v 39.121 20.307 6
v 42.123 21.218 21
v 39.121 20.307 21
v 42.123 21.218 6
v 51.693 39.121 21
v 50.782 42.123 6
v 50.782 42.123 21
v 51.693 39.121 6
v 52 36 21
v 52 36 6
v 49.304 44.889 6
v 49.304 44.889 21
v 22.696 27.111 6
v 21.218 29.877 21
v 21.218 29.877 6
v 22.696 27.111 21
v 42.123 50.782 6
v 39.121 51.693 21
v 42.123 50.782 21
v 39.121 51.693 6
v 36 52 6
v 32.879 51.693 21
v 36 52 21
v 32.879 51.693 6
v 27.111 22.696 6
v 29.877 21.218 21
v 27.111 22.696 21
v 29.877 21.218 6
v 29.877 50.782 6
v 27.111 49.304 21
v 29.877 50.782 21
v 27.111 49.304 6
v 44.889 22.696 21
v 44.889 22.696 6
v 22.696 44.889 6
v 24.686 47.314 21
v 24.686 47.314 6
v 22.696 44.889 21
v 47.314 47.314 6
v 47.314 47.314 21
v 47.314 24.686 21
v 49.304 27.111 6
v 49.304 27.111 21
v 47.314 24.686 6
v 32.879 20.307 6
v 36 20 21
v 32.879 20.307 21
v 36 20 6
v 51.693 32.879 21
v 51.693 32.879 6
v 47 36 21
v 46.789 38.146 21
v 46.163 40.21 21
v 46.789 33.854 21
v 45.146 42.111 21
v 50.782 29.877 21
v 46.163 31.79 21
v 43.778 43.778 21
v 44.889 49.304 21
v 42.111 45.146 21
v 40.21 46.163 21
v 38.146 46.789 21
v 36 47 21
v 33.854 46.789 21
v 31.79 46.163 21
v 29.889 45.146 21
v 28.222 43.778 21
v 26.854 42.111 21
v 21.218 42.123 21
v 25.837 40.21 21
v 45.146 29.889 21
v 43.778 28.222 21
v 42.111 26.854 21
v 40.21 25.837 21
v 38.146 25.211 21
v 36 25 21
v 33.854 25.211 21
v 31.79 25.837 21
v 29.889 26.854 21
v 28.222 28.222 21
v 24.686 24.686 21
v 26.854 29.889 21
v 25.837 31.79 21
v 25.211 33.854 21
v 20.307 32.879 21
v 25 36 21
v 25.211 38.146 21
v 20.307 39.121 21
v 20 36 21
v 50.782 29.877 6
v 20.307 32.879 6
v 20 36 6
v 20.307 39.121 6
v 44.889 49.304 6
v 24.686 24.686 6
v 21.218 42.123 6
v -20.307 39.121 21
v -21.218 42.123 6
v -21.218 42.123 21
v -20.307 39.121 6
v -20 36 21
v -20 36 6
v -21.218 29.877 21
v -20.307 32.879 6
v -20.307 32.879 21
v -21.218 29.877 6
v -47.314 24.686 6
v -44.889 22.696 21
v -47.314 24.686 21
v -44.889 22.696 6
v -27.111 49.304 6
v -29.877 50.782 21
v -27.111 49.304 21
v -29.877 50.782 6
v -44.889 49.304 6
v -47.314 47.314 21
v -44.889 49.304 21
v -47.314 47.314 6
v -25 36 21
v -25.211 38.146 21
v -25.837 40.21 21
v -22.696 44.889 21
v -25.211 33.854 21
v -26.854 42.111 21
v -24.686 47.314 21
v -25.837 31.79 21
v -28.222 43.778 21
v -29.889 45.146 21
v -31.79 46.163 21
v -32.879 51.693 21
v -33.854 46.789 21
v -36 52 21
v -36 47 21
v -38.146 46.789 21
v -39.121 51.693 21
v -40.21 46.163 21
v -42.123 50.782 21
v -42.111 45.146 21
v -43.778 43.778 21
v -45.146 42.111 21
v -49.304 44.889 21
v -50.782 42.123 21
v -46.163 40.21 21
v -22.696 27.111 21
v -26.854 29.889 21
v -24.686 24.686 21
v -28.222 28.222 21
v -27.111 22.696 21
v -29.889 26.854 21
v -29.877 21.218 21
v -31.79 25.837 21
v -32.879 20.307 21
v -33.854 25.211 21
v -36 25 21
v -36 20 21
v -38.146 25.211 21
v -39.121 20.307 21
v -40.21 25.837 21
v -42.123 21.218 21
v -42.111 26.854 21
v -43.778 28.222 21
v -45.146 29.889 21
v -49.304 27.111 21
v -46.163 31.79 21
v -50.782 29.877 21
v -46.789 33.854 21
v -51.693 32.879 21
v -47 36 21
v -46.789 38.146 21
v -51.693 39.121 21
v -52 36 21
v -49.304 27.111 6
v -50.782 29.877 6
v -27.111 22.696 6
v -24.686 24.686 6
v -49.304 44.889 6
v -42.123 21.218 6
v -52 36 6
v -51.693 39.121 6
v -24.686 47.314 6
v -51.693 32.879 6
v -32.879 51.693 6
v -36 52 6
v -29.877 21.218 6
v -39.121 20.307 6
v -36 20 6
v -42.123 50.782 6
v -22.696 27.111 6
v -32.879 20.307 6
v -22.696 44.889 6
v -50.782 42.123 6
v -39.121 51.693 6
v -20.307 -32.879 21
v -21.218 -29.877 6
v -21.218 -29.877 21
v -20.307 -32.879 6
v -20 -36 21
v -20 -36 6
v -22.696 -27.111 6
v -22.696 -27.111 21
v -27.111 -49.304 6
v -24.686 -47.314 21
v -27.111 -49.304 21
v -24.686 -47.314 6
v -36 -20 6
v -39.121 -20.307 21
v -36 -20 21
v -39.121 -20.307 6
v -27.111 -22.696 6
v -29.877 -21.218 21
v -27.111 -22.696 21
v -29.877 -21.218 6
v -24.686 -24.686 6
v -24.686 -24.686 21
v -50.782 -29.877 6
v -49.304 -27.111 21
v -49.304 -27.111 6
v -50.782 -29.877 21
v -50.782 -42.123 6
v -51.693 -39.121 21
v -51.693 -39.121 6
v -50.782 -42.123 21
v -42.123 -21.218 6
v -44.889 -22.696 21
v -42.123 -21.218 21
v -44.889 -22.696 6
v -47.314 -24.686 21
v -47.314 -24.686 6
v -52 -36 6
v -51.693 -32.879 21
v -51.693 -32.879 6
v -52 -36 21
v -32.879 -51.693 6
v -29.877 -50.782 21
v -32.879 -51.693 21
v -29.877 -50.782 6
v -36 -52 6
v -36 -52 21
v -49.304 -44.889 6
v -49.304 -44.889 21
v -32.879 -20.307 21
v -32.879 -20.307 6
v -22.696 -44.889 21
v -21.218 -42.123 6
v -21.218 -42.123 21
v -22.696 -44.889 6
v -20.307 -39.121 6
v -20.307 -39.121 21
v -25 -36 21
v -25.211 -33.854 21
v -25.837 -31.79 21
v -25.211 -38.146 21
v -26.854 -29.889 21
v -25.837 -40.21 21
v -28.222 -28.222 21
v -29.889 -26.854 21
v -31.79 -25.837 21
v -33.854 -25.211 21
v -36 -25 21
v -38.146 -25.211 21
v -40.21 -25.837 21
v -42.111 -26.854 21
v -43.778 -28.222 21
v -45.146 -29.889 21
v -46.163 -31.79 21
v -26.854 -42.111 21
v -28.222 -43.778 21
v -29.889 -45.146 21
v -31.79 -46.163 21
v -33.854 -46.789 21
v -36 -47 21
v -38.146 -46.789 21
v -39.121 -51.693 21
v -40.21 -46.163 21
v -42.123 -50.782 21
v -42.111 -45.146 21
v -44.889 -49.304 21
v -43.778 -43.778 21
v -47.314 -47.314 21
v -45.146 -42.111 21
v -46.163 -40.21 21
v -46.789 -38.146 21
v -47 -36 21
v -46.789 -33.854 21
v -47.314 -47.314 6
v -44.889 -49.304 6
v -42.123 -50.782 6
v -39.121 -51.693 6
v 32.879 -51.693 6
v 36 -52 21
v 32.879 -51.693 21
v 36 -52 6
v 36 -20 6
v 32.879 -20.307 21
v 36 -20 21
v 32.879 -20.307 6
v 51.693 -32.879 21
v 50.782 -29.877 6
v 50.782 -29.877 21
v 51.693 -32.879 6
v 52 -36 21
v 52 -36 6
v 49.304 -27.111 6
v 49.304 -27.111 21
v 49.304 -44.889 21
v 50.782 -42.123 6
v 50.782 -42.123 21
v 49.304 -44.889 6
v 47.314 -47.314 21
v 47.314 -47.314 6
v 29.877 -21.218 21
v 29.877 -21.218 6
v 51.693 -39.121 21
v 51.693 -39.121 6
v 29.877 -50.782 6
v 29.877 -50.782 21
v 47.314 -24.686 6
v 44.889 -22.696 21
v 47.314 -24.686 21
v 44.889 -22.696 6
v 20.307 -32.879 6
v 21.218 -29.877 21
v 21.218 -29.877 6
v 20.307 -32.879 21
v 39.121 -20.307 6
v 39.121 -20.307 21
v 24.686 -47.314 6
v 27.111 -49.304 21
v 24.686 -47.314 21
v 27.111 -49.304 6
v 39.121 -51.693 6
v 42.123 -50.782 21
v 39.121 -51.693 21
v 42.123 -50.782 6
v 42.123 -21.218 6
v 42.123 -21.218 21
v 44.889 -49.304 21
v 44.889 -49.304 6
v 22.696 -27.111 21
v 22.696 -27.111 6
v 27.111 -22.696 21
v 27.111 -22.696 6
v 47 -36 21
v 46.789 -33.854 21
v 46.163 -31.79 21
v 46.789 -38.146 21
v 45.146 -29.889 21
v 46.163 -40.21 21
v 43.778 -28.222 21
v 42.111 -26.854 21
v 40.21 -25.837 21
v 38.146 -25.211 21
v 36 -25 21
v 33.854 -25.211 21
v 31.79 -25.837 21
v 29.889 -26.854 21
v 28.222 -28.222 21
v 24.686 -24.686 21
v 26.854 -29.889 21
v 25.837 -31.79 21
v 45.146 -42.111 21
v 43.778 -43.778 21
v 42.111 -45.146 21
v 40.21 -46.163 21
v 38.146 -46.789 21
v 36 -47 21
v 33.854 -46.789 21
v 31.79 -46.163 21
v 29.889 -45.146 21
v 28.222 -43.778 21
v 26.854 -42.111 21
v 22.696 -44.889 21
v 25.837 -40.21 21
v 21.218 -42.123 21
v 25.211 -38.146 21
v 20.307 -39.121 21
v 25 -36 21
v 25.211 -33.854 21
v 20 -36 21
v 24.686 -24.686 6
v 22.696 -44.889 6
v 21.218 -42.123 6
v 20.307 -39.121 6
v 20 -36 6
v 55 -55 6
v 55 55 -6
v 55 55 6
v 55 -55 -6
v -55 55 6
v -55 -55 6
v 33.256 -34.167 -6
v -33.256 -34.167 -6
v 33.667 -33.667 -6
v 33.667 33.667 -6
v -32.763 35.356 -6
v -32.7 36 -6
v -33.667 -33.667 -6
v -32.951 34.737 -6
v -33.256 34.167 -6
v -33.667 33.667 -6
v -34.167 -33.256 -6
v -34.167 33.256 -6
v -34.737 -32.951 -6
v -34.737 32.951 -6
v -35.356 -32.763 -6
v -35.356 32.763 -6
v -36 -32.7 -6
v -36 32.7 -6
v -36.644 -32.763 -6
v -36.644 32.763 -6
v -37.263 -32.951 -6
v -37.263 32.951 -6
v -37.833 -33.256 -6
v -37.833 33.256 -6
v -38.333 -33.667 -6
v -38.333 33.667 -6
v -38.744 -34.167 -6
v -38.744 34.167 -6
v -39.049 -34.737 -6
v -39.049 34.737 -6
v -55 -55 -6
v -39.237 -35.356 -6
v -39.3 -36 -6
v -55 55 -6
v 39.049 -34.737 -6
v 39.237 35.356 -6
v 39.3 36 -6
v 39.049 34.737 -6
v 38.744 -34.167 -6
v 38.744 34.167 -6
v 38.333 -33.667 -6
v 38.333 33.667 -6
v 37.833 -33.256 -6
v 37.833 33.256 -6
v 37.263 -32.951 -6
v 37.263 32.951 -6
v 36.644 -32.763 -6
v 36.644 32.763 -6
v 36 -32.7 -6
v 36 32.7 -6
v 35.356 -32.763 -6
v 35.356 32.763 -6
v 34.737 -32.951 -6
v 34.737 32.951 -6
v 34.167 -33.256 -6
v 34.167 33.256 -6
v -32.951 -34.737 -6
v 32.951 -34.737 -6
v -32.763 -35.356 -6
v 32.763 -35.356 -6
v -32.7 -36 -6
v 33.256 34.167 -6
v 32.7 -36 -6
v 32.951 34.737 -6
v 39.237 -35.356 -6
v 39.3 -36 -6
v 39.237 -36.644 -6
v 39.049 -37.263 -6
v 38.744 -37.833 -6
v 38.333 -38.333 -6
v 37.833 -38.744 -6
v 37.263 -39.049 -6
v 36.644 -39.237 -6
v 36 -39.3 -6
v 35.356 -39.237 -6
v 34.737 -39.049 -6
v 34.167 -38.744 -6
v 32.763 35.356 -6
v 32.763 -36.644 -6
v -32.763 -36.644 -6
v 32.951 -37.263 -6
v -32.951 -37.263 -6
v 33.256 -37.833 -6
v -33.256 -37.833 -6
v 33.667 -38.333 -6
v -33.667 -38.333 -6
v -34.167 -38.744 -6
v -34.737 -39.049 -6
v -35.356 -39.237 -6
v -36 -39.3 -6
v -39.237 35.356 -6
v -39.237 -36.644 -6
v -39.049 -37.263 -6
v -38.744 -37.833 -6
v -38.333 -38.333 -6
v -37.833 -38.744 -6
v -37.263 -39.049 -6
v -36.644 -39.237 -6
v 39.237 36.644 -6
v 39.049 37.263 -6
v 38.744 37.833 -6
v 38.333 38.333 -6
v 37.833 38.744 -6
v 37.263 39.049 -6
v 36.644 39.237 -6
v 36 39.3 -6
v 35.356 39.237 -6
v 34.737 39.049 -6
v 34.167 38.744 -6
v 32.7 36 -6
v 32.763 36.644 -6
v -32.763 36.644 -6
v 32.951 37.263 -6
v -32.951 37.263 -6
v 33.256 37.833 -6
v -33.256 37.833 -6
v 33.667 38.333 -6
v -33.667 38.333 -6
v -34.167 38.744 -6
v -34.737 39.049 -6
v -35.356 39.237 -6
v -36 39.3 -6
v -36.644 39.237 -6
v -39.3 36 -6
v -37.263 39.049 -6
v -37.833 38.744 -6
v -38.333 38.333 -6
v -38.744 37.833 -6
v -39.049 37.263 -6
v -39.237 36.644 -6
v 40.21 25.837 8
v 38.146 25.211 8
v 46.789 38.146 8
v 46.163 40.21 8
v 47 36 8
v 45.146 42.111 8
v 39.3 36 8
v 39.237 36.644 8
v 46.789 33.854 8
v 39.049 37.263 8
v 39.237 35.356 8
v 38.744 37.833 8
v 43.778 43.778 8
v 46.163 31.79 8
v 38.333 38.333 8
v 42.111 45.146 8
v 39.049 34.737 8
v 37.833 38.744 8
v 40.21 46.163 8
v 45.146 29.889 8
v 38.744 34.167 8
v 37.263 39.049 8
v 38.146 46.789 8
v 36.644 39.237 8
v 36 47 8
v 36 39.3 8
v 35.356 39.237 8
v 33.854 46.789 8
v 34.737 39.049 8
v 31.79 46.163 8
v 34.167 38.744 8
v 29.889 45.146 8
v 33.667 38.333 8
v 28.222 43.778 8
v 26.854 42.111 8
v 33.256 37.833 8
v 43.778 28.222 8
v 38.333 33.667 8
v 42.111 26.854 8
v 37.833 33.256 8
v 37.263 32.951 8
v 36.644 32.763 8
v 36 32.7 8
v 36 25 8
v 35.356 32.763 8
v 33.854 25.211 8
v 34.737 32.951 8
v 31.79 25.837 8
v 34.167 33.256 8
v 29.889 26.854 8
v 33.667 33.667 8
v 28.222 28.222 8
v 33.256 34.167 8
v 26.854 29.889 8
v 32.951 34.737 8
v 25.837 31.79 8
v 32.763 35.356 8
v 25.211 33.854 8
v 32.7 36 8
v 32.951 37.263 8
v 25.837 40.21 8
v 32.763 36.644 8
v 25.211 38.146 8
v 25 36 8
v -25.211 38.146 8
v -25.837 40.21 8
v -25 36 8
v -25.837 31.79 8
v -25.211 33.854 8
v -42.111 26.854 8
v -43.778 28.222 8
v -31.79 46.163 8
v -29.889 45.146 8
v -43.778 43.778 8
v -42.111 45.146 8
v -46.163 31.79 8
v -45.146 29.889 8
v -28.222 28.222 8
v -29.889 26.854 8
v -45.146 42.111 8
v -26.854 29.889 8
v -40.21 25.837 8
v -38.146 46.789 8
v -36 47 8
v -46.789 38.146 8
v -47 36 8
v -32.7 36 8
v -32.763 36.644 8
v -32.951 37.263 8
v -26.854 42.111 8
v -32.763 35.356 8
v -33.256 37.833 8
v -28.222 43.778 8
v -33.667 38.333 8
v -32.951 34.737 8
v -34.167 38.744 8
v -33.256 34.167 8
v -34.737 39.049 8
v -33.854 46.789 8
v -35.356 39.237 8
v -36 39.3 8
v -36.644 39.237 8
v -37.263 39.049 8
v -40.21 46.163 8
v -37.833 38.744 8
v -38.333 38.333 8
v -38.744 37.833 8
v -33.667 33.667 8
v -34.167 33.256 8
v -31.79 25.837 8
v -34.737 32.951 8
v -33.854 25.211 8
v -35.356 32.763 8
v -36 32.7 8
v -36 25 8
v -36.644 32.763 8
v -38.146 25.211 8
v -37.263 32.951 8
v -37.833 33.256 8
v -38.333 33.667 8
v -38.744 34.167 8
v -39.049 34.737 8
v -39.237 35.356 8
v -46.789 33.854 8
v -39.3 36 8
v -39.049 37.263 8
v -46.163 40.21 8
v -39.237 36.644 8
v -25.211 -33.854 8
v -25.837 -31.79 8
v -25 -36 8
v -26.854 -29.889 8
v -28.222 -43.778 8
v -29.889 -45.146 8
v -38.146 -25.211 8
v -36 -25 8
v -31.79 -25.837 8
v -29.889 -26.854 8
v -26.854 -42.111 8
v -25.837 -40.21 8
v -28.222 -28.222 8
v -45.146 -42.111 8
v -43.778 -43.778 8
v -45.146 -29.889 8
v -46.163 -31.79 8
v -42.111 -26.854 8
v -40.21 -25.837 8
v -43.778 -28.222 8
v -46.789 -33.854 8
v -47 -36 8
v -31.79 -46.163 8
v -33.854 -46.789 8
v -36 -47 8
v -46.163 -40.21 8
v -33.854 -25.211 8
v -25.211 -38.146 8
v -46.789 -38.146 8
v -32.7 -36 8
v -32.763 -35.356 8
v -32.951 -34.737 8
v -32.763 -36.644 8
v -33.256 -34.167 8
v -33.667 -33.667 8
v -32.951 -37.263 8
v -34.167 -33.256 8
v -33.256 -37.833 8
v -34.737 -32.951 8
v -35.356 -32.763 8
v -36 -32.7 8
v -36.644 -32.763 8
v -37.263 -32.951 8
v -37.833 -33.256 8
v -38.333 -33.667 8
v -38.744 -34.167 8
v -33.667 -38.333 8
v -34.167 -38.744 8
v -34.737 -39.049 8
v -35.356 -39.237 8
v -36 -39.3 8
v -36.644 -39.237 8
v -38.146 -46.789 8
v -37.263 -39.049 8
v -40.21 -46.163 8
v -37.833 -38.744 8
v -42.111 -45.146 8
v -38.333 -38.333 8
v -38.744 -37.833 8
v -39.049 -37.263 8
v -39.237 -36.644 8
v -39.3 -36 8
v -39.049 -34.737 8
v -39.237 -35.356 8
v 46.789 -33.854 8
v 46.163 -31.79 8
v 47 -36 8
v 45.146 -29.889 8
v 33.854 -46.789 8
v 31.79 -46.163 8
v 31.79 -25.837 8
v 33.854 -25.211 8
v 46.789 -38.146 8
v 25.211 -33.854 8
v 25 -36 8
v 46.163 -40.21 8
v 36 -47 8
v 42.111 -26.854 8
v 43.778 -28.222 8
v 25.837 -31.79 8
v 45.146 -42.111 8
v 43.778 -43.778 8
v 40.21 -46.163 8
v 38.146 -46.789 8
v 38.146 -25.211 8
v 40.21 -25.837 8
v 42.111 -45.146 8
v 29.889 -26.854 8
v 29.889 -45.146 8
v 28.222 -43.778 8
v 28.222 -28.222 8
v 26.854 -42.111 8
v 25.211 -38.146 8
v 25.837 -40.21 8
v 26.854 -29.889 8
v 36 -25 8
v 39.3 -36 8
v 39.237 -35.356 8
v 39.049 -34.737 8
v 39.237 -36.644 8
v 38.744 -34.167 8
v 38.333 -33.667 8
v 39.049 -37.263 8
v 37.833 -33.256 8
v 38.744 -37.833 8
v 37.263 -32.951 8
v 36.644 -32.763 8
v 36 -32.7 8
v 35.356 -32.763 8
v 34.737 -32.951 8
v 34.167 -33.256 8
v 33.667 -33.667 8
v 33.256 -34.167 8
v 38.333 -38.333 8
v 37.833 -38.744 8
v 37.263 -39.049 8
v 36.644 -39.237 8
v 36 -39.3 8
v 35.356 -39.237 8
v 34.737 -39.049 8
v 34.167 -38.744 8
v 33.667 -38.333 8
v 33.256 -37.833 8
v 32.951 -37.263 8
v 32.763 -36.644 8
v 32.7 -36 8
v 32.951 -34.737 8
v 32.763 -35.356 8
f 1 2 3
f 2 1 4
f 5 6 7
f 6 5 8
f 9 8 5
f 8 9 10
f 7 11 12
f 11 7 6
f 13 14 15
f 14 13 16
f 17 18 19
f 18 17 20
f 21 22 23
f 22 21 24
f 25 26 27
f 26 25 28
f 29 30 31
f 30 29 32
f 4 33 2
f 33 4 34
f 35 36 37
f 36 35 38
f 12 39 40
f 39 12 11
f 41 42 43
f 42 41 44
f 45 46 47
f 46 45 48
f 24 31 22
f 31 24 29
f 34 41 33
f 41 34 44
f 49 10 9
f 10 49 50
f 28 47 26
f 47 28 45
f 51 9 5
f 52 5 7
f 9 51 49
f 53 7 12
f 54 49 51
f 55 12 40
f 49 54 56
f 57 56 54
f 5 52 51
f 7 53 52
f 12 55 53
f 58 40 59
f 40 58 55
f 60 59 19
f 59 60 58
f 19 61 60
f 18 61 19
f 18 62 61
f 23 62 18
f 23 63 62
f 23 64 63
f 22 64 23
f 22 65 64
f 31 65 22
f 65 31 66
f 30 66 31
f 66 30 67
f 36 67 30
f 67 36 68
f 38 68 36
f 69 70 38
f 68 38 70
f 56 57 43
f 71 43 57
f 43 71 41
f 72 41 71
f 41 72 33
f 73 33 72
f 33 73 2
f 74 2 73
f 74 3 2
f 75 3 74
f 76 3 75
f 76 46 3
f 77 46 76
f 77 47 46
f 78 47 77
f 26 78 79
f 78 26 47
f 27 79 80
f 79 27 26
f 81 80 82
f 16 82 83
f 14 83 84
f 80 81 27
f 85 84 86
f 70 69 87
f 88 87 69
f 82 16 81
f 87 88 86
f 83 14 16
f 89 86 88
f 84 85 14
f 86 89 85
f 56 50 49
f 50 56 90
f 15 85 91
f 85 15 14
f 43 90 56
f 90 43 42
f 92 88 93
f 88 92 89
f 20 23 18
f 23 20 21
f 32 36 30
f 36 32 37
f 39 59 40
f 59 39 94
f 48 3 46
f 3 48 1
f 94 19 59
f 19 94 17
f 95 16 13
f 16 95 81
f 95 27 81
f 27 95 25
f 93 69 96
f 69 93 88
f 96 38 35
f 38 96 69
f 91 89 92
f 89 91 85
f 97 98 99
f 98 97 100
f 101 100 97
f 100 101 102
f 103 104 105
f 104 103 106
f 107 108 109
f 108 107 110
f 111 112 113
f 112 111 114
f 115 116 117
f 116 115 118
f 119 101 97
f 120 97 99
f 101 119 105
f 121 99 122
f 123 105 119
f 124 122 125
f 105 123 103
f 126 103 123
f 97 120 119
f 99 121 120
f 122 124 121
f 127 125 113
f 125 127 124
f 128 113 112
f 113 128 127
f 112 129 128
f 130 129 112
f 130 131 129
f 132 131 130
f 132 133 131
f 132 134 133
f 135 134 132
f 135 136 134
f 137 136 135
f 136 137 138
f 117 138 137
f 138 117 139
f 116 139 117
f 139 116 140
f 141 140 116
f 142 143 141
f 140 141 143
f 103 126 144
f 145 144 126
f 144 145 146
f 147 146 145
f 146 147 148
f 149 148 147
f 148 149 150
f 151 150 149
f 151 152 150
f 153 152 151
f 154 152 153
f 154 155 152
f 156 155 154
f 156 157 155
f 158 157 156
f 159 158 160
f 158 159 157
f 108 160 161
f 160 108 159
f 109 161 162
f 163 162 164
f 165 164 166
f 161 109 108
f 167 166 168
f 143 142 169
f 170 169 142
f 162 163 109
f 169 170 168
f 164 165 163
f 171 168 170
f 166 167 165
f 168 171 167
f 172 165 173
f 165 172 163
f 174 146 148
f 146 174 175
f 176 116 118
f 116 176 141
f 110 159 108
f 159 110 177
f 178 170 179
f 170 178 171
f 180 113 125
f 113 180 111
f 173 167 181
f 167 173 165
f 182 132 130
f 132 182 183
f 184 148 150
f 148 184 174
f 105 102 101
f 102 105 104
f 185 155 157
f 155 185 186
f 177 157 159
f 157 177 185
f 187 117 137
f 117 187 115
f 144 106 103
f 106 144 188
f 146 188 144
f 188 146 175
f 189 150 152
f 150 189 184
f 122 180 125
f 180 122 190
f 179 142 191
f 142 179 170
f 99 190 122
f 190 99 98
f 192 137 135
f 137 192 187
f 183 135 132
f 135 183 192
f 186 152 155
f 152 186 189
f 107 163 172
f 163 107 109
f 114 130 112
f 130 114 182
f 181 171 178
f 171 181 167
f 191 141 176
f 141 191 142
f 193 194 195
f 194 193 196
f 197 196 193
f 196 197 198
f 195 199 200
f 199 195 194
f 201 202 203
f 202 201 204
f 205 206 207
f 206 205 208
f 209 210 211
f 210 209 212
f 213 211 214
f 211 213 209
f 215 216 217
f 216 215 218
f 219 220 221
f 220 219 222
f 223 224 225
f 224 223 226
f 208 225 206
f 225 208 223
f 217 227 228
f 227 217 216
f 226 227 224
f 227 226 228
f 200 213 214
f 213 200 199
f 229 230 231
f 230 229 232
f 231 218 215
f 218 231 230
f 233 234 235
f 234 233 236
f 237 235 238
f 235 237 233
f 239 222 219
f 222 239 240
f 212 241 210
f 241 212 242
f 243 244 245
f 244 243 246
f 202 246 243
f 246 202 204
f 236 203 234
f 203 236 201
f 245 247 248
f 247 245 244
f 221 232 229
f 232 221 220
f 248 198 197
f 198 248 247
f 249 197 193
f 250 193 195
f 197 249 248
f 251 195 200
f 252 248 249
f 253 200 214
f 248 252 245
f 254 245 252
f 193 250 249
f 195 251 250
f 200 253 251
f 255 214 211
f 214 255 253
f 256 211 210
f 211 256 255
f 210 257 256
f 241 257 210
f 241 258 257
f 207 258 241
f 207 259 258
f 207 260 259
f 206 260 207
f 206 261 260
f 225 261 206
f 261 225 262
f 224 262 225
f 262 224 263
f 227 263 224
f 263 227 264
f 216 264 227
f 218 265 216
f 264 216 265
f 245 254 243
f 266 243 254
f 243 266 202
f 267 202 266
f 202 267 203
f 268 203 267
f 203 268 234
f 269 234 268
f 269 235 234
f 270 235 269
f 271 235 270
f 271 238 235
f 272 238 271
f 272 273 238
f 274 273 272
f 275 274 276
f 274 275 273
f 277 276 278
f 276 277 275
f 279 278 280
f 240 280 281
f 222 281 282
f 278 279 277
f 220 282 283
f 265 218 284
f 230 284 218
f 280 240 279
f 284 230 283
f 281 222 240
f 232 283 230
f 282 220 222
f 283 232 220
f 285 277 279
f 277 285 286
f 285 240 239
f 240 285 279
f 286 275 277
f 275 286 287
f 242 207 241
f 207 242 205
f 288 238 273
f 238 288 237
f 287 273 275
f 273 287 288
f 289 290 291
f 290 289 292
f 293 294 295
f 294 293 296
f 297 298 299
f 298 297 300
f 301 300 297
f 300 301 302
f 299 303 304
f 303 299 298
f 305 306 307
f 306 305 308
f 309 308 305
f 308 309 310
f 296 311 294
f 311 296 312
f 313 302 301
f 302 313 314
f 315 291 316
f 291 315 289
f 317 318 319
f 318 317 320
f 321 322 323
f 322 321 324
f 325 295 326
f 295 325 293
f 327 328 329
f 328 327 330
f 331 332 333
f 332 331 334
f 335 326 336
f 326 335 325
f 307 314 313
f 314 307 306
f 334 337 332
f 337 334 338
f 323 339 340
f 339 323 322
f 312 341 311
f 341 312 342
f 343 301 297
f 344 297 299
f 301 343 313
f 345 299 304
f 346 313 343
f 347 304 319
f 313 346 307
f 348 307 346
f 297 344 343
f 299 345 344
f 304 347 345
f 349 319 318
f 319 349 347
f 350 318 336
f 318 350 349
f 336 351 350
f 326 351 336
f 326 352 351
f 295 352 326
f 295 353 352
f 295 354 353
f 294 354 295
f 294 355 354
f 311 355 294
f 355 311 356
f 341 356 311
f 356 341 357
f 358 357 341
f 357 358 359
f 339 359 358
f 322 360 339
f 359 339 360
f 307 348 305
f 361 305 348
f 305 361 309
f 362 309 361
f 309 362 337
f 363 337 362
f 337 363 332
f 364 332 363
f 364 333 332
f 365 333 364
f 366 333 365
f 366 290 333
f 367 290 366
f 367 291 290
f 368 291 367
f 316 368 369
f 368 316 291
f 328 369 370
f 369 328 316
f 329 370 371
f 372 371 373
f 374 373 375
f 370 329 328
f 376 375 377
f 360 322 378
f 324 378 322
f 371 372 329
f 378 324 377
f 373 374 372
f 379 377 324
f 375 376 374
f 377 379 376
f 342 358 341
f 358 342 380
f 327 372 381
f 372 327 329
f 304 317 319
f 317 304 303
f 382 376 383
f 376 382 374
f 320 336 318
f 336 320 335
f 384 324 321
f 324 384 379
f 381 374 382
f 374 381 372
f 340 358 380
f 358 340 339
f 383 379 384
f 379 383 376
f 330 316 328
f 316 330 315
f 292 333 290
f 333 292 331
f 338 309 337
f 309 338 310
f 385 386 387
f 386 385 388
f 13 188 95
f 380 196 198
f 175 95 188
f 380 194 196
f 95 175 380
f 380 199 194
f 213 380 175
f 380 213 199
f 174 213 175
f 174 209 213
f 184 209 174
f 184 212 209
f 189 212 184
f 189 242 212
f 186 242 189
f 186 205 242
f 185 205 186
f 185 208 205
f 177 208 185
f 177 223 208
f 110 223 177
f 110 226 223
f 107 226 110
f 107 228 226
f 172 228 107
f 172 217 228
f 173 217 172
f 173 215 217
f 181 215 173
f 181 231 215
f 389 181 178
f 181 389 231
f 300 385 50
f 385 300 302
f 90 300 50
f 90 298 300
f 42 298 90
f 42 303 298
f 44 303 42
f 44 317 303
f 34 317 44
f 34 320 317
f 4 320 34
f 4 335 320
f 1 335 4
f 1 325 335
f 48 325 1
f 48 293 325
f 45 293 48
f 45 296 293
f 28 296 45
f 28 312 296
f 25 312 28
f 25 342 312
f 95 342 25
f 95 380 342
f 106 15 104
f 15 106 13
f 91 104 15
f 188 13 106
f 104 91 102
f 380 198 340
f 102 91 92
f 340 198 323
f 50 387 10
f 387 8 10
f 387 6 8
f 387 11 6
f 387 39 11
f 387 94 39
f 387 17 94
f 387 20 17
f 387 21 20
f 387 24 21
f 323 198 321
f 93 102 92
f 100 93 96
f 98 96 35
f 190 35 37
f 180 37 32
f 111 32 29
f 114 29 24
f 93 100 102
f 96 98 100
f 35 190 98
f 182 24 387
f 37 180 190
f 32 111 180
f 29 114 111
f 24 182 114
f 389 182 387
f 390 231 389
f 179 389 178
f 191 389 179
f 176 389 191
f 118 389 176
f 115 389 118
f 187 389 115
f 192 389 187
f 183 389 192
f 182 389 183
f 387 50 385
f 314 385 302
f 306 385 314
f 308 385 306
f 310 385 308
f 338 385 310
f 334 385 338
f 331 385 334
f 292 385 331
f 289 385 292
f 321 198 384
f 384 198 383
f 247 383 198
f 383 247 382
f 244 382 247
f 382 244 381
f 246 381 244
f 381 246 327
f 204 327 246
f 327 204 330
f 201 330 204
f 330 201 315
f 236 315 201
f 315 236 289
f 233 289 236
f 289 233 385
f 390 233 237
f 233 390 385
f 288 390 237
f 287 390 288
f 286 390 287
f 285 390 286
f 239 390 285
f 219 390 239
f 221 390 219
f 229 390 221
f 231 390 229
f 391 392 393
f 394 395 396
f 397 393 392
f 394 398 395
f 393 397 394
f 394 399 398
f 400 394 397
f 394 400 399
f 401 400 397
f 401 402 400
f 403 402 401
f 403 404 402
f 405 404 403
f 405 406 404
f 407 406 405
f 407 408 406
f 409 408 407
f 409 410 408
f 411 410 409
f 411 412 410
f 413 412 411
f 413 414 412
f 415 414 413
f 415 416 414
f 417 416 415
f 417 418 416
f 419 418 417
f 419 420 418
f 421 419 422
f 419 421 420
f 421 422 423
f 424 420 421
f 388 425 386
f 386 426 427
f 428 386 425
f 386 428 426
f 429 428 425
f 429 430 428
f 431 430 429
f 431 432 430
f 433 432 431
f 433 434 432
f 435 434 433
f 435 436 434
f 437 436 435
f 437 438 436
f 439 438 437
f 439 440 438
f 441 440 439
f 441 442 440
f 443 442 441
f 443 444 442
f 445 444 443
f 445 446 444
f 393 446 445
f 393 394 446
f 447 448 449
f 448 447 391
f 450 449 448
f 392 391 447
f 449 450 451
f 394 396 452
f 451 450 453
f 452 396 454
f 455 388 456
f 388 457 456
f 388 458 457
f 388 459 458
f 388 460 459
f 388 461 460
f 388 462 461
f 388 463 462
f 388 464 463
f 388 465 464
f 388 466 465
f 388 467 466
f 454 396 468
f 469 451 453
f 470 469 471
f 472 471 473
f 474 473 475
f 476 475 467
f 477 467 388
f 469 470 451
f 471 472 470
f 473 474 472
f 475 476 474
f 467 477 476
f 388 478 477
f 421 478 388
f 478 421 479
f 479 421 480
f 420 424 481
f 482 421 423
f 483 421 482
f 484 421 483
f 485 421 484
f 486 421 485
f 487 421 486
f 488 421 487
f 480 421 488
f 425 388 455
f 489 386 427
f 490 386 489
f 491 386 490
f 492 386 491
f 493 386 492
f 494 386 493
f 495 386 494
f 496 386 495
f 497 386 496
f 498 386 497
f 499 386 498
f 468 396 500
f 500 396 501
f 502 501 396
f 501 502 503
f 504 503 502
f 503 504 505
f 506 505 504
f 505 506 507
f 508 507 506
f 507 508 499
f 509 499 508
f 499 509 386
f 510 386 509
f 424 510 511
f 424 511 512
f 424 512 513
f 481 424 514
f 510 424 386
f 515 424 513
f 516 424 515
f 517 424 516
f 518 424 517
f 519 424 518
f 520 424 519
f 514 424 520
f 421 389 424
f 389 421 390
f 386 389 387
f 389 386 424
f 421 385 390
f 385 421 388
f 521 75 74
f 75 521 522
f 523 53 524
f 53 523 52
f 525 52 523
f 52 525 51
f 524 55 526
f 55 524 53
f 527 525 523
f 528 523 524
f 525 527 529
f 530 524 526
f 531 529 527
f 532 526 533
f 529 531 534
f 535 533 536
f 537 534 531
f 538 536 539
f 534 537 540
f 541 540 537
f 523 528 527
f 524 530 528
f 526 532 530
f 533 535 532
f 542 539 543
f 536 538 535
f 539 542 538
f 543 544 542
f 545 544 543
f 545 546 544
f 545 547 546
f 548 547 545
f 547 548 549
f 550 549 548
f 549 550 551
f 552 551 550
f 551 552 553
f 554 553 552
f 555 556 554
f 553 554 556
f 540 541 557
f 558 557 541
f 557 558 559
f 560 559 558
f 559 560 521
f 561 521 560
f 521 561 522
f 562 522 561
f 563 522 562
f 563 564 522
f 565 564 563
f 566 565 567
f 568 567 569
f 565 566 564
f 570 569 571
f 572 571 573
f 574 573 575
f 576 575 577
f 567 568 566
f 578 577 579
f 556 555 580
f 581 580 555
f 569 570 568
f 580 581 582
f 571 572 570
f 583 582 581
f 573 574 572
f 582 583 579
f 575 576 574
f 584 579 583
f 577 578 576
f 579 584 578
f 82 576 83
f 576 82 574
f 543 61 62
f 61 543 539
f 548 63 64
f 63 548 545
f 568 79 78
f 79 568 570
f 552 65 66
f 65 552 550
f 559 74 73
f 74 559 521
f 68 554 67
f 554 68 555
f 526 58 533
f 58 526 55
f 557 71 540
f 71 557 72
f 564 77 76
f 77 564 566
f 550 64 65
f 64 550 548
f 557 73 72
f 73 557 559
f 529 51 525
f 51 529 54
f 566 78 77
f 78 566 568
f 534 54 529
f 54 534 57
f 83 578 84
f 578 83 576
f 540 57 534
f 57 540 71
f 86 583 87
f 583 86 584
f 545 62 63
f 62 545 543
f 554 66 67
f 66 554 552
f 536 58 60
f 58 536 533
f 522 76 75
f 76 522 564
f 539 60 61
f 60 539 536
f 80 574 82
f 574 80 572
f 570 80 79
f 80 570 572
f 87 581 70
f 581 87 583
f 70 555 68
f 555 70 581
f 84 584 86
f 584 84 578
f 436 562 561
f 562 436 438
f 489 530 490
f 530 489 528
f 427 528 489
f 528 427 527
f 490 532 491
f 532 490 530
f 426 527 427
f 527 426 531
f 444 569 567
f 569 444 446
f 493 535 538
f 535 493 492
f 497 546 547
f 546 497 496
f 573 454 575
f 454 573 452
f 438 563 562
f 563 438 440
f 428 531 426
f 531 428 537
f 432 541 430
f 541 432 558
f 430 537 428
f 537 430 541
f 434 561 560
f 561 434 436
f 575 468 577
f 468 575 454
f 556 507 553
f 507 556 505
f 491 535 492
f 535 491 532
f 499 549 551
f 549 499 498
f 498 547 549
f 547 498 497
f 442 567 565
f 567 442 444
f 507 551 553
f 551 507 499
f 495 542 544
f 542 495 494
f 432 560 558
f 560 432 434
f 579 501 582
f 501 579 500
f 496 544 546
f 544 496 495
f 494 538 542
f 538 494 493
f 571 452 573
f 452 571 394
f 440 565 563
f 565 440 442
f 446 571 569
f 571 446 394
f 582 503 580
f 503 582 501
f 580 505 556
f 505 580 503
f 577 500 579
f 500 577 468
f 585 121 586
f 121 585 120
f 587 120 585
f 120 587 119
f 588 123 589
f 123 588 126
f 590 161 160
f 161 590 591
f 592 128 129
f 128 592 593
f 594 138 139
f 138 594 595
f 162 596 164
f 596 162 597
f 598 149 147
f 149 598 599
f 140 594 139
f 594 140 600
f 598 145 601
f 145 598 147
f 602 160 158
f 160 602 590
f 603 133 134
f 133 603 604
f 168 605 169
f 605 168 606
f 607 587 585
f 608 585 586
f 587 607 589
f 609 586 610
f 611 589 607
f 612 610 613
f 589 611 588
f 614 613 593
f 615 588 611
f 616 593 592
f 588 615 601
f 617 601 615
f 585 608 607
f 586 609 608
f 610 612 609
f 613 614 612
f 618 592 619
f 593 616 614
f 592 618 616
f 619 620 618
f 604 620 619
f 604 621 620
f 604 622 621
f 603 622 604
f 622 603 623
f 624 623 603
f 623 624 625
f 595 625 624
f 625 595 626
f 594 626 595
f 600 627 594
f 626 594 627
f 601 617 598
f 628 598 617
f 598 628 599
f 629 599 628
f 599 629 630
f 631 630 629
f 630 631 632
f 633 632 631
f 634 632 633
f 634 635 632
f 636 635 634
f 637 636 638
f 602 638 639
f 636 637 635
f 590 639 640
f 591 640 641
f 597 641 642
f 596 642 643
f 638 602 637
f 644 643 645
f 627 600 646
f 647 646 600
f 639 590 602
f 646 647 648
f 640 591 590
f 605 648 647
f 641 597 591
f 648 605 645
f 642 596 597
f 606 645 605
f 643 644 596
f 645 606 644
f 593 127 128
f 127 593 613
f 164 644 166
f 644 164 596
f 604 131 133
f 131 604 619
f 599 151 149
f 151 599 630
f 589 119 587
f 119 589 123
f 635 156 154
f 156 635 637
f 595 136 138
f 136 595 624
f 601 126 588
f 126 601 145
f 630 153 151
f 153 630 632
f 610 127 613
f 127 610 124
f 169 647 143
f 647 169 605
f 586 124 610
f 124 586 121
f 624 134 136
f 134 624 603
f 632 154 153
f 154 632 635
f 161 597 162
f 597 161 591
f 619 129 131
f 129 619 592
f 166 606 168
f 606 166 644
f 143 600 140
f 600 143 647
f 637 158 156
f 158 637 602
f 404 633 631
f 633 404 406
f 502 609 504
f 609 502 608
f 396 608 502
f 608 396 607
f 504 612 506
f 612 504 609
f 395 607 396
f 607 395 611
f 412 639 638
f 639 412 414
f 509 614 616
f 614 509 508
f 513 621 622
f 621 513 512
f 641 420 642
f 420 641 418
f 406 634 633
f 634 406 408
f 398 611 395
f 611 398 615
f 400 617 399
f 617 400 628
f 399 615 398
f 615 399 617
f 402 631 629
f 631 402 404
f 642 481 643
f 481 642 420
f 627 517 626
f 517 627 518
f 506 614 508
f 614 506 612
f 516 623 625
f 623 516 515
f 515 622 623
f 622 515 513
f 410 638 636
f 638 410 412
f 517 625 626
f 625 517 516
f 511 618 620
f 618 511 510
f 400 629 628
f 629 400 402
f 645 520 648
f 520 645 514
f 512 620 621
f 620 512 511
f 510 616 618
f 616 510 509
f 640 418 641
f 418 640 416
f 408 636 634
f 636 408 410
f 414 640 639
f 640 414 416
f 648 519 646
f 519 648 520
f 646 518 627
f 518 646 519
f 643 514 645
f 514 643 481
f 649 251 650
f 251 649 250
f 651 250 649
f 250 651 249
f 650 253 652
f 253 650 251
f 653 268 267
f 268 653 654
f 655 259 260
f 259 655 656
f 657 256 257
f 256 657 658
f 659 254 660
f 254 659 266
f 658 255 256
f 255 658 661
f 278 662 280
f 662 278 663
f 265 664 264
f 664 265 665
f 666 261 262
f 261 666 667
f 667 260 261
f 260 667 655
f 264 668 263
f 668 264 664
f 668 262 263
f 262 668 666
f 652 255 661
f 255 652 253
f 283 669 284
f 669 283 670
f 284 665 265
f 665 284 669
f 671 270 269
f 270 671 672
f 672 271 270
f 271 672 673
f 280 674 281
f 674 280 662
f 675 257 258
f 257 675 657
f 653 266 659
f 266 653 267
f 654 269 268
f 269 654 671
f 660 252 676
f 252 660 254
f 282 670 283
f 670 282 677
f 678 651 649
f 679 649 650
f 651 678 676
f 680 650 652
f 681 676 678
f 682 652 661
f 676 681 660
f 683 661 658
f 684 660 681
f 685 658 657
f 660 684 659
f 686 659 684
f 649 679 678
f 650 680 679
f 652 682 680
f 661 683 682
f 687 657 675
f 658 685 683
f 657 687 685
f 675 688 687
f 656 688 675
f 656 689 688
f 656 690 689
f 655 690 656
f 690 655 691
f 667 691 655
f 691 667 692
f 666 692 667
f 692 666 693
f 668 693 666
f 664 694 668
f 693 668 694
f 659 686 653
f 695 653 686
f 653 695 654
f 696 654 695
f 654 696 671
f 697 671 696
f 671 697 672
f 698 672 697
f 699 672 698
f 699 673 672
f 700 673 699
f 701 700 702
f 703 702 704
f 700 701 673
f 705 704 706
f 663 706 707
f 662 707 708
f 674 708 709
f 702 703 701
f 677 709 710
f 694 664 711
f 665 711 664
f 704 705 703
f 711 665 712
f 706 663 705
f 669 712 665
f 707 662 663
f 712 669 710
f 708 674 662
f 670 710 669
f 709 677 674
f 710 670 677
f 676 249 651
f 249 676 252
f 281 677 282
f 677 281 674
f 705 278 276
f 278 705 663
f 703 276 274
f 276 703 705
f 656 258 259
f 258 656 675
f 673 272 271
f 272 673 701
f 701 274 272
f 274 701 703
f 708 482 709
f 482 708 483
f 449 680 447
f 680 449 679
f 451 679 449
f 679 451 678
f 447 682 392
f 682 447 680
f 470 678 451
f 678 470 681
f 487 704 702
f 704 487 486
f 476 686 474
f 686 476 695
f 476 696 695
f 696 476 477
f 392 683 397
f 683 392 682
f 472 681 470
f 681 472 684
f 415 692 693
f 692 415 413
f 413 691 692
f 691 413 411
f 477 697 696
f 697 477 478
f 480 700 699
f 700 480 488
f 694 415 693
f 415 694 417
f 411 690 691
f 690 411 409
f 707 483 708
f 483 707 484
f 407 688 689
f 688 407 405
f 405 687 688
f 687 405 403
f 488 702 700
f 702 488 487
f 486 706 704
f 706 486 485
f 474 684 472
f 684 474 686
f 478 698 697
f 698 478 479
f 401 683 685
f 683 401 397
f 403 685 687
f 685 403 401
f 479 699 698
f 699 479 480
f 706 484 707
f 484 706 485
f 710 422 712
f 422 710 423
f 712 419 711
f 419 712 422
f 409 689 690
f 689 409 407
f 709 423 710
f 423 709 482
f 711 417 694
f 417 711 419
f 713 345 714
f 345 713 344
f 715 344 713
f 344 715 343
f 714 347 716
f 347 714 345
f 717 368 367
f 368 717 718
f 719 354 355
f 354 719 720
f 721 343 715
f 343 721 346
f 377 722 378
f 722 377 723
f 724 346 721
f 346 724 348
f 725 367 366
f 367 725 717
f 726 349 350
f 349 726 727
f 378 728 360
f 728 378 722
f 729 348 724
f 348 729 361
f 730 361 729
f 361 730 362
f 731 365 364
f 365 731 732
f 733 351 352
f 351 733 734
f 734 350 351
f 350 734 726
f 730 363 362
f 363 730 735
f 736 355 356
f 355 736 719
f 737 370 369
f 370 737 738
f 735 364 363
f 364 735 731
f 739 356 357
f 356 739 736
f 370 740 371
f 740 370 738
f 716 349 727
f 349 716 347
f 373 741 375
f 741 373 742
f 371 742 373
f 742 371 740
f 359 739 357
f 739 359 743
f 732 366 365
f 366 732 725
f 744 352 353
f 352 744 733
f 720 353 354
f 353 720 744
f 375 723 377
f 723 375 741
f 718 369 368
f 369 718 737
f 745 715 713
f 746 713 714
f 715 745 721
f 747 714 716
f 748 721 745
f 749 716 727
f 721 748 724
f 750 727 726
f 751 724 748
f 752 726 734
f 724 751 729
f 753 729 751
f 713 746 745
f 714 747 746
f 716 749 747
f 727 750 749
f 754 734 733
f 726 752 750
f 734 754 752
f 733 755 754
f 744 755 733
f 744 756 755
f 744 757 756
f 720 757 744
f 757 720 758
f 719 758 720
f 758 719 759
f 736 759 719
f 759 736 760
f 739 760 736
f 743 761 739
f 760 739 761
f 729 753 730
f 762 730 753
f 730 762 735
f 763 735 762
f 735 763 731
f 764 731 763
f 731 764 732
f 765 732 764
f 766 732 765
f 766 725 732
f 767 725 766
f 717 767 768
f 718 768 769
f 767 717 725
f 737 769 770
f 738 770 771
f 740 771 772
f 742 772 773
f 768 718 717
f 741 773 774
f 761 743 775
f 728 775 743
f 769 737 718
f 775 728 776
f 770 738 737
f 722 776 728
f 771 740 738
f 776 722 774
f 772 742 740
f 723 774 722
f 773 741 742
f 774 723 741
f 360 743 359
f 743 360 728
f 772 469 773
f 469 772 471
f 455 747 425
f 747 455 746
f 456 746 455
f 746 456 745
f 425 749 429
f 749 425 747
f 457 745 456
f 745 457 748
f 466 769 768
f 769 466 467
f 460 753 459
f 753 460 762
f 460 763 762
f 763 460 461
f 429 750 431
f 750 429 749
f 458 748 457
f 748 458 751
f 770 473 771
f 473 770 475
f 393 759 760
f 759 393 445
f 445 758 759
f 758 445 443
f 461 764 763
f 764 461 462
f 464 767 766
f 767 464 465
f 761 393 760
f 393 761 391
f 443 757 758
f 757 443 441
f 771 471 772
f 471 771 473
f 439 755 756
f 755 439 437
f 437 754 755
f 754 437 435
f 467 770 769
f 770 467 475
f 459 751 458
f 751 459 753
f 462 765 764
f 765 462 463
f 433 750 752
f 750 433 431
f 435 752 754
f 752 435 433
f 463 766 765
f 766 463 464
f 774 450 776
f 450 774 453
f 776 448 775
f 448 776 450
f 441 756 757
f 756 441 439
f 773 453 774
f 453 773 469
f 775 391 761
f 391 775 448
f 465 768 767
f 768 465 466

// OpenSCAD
$fn = 32;

// ----------------------------------------------------------------------
// Socket pad plate
// bosses with counterbored sockets for the screws
// ----------------------------------------------------------------------

// --- parameters (mm) ---
base_t = 12;             // base plate thickness
boss_h = 15;             // boss height above the base plate
boss_d = 32;             // boss diameter
socket_d = 22;           // socket diameter
socket_depth = 13;       // socket depth from the boss face
bolt_d = 6.6;            // screw clearance hole through the socket floor
plate = [110, 110, 12];  // overall size (x, y, z)
edge = 19;               // boss centre offset from the plate edge
pads = 4;                // boss count, one per corner

// --- derived feature positions (mm) ---
height = base_t + boss_h;        // = 27   overall height of the part
corner_x = plate[0] / 2 - edge;  // = 36   boss centre X
corner_y = plate[1] / 2 - edge;  // = 36   boss centre Y
feature_centers = [
  [corner_x, corner_y],
  [-corner_x, corner_y],
  [-corner_x, -corner_y],
  [corner_x, -corner_y]
];   // boss centres: sockets, holes and the pads themselves are placed from here

// base plate, bosses on feature_centers, socket + through hole in each
difference() {
  union() {
    cube(plate, center = true);
    for (centre = feature_centers)
      translate([centre[0], centre[1], plate[2] / 2 - 1])
        cylinder(d = boss_d, h = boss_h + 1);
  }
  for (centre = feature_centers) {
    translate([centre[0], centre[1], plate[2] / 2 + boss_h - socket_depth])
      cylinder(d = socket_d, h = socket_depth + 1);
    translate([centre[0], centre[1], -height])
      cylinder(d = bolt_d, h = 2 * height + 2);  // through the socket floor
  }
}
